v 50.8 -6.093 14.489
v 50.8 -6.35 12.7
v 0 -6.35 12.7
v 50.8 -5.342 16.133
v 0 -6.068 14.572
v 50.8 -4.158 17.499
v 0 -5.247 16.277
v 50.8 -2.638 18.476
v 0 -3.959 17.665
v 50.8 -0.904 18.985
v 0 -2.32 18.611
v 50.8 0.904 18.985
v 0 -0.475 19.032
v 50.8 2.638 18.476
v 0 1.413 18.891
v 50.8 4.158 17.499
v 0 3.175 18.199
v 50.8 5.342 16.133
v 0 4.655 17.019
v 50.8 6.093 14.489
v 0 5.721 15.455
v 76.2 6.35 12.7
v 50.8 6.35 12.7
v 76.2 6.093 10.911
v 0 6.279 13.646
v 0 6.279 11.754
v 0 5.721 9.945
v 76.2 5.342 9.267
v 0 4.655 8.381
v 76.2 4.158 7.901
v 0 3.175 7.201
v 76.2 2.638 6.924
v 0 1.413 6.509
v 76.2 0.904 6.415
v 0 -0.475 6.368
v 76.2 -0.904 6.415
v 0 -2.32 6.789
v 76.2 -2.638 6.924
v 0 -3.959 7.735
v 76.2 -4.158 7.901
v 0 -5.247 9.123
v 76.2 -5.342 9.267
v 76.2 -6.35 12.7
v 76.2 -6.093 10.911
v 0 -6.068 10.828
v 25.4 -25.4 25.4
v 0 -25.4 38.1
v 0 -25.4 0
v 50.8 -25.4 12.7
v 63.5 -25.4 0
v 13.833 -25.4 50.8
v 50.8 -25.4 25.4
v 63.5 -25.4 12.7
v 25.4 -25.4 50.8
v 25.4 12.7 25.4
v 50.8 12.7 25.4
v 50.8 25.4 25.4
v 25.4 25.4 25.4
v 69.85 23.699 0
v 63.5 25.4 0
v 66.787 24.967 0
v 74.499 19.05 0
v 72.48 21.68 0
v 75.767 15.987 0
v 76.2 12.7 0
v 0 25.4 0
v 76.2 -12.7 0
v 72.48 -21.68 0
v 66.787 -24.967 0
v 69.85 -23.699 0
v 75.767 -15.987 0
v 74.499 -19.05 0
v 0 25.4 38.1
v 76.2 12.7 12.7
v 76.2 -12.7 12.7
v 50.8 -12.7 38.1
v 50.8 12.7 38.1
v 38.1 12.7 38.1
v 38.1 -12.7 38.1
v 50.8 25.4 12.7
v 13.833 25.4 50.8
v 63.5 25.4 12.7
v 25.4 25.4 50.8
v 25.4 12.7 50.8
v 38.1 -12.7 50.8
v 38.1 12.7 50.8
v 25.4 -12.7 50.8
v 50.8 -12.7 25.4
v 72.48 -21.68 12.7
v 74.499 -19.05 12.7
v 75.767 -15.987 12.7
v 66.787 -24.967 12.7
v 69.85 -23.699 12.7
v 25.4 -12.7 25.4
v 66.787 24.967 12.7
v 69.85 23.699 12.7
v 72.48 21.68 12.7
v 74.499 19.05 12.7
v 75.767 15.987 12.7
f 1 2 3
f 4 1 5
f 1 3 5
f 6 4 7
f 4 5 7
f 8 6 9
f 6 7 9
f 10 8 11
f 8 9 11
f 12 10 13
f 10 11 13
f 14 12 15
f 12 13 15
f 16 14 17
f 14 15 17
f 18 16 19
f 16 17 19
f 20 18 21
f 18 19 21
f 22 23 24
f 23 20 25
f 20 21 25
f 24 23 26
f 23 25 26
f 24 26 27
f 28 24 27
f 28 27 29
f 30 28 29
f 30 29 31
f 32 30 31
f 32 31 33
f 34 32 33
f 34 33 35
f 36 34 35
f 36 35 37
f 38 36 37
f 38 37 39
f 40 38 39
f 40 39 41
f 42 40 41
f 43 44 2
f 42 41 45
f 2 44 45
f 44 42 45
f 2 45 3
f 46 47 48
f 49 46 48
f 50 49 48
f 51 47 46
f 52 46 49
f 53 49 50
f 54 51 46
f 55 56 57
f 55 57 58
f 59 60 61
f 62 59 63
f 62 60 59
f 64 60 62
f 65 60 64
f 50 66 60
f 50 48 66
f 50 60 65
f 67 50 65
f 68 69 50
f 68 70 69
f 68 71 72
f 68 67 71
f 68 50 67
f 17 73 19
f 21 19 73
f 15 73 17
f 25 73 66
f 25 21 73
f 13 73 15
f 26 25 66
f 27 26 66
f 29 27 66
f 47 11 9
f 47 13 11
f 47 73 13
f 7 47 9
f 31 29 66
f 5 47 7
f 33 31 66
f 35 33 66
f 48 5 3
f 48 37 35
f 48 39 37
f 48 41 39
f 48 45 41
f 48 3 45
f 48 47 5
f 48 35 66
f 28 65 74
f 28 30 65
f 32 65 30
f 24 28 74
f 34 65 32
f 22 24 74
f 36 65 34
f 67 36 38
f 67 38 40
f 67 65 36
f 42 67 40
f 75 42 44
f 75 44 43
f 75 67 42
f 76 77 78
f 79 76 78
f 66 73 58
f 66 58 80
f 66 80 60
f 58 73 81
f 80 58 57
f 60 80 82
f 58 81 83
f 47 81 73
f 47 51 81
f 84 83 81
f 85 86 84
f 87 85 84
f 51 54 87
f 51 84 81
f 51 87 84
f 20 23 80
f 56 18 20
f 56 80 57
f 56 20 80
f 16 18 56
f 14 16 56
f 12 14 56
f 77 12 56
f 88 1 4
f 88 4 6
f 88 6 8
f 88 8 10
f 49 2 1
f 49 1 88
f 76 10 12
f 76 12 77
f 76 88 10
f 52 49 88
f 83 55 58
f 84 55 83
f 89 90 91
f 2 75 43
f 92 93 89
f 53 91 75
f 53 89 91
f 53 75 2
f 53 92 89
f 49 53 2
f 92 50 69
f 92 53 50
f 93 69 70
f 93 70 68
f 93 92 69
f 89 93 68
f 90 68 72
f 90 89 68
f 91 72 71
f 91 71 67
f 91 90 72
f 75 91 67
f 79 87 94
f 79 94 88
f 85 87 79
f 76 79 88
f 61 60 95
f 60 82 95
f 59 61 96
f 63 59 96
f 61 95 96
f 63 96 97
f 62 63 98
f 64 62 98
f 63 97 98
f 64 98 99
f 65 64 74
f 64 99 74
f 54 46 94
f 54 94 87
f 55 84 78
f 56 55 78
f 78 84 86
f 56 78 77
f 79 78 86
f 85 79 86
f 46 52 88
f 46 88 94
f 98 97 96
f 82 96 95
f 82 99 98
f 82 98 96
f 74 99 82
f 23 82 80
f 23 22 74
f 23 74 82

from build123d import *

# Parameters (mm, degrees)
F1_DEPTH = 25.4
F2_DEPTH = 12.7
F3_R     = 6.35
F4_DEPTH = 76.201
F5_R     = 12.7


with BuildPart() as f1:
    # F0 (on Front) → F1 (new body, symmetric)
    with BuildSketch(Plane.XZ):
        Polygon((0, 38.1), (0, 0), (76.2, 0), (76.2, 12.7), (50.8, 12.7), (50.8, 25.4), (25.4, 25.4), (25.4, 50.8), (13.832867, 50.8), align=None)
    extrude(amount=F1_DEPTH, both=True)

    # F0 (on Front) → F2 (join, symmetric)
    with BuildSketch(Plane.XZ):
        Polygon((38.1, 50.8), (25.4, 50.8), (25.4, 25.4), (50.8, 25.4), (50.8, 38.1), (38.1, 38.1), align=None)
    extrude(amount=F2_DEPTH, both=True)

    # F3 (on face) → F4 (cut, through all)
    with BuildSketch(Plane(origin=(0, 0, 0), x_dir=(0, -1, 0), z_dir=(-1, 0, 0))):
        with Locations((0, 12.7)):
            Circle(F3_R)
    extrude(amount=-F4_DEPTH, mode=Mode.SUBTRACT)

    # F5
    f5_edges = [f1.edges().sort_by_distance(p)[0] for p in [
        (76.2, 25.4, 6.35),
        (76.2, -25.4, 6.35),
    ]]
    fillet(f5_edges, radius=F5_R)


solid = f1.part
